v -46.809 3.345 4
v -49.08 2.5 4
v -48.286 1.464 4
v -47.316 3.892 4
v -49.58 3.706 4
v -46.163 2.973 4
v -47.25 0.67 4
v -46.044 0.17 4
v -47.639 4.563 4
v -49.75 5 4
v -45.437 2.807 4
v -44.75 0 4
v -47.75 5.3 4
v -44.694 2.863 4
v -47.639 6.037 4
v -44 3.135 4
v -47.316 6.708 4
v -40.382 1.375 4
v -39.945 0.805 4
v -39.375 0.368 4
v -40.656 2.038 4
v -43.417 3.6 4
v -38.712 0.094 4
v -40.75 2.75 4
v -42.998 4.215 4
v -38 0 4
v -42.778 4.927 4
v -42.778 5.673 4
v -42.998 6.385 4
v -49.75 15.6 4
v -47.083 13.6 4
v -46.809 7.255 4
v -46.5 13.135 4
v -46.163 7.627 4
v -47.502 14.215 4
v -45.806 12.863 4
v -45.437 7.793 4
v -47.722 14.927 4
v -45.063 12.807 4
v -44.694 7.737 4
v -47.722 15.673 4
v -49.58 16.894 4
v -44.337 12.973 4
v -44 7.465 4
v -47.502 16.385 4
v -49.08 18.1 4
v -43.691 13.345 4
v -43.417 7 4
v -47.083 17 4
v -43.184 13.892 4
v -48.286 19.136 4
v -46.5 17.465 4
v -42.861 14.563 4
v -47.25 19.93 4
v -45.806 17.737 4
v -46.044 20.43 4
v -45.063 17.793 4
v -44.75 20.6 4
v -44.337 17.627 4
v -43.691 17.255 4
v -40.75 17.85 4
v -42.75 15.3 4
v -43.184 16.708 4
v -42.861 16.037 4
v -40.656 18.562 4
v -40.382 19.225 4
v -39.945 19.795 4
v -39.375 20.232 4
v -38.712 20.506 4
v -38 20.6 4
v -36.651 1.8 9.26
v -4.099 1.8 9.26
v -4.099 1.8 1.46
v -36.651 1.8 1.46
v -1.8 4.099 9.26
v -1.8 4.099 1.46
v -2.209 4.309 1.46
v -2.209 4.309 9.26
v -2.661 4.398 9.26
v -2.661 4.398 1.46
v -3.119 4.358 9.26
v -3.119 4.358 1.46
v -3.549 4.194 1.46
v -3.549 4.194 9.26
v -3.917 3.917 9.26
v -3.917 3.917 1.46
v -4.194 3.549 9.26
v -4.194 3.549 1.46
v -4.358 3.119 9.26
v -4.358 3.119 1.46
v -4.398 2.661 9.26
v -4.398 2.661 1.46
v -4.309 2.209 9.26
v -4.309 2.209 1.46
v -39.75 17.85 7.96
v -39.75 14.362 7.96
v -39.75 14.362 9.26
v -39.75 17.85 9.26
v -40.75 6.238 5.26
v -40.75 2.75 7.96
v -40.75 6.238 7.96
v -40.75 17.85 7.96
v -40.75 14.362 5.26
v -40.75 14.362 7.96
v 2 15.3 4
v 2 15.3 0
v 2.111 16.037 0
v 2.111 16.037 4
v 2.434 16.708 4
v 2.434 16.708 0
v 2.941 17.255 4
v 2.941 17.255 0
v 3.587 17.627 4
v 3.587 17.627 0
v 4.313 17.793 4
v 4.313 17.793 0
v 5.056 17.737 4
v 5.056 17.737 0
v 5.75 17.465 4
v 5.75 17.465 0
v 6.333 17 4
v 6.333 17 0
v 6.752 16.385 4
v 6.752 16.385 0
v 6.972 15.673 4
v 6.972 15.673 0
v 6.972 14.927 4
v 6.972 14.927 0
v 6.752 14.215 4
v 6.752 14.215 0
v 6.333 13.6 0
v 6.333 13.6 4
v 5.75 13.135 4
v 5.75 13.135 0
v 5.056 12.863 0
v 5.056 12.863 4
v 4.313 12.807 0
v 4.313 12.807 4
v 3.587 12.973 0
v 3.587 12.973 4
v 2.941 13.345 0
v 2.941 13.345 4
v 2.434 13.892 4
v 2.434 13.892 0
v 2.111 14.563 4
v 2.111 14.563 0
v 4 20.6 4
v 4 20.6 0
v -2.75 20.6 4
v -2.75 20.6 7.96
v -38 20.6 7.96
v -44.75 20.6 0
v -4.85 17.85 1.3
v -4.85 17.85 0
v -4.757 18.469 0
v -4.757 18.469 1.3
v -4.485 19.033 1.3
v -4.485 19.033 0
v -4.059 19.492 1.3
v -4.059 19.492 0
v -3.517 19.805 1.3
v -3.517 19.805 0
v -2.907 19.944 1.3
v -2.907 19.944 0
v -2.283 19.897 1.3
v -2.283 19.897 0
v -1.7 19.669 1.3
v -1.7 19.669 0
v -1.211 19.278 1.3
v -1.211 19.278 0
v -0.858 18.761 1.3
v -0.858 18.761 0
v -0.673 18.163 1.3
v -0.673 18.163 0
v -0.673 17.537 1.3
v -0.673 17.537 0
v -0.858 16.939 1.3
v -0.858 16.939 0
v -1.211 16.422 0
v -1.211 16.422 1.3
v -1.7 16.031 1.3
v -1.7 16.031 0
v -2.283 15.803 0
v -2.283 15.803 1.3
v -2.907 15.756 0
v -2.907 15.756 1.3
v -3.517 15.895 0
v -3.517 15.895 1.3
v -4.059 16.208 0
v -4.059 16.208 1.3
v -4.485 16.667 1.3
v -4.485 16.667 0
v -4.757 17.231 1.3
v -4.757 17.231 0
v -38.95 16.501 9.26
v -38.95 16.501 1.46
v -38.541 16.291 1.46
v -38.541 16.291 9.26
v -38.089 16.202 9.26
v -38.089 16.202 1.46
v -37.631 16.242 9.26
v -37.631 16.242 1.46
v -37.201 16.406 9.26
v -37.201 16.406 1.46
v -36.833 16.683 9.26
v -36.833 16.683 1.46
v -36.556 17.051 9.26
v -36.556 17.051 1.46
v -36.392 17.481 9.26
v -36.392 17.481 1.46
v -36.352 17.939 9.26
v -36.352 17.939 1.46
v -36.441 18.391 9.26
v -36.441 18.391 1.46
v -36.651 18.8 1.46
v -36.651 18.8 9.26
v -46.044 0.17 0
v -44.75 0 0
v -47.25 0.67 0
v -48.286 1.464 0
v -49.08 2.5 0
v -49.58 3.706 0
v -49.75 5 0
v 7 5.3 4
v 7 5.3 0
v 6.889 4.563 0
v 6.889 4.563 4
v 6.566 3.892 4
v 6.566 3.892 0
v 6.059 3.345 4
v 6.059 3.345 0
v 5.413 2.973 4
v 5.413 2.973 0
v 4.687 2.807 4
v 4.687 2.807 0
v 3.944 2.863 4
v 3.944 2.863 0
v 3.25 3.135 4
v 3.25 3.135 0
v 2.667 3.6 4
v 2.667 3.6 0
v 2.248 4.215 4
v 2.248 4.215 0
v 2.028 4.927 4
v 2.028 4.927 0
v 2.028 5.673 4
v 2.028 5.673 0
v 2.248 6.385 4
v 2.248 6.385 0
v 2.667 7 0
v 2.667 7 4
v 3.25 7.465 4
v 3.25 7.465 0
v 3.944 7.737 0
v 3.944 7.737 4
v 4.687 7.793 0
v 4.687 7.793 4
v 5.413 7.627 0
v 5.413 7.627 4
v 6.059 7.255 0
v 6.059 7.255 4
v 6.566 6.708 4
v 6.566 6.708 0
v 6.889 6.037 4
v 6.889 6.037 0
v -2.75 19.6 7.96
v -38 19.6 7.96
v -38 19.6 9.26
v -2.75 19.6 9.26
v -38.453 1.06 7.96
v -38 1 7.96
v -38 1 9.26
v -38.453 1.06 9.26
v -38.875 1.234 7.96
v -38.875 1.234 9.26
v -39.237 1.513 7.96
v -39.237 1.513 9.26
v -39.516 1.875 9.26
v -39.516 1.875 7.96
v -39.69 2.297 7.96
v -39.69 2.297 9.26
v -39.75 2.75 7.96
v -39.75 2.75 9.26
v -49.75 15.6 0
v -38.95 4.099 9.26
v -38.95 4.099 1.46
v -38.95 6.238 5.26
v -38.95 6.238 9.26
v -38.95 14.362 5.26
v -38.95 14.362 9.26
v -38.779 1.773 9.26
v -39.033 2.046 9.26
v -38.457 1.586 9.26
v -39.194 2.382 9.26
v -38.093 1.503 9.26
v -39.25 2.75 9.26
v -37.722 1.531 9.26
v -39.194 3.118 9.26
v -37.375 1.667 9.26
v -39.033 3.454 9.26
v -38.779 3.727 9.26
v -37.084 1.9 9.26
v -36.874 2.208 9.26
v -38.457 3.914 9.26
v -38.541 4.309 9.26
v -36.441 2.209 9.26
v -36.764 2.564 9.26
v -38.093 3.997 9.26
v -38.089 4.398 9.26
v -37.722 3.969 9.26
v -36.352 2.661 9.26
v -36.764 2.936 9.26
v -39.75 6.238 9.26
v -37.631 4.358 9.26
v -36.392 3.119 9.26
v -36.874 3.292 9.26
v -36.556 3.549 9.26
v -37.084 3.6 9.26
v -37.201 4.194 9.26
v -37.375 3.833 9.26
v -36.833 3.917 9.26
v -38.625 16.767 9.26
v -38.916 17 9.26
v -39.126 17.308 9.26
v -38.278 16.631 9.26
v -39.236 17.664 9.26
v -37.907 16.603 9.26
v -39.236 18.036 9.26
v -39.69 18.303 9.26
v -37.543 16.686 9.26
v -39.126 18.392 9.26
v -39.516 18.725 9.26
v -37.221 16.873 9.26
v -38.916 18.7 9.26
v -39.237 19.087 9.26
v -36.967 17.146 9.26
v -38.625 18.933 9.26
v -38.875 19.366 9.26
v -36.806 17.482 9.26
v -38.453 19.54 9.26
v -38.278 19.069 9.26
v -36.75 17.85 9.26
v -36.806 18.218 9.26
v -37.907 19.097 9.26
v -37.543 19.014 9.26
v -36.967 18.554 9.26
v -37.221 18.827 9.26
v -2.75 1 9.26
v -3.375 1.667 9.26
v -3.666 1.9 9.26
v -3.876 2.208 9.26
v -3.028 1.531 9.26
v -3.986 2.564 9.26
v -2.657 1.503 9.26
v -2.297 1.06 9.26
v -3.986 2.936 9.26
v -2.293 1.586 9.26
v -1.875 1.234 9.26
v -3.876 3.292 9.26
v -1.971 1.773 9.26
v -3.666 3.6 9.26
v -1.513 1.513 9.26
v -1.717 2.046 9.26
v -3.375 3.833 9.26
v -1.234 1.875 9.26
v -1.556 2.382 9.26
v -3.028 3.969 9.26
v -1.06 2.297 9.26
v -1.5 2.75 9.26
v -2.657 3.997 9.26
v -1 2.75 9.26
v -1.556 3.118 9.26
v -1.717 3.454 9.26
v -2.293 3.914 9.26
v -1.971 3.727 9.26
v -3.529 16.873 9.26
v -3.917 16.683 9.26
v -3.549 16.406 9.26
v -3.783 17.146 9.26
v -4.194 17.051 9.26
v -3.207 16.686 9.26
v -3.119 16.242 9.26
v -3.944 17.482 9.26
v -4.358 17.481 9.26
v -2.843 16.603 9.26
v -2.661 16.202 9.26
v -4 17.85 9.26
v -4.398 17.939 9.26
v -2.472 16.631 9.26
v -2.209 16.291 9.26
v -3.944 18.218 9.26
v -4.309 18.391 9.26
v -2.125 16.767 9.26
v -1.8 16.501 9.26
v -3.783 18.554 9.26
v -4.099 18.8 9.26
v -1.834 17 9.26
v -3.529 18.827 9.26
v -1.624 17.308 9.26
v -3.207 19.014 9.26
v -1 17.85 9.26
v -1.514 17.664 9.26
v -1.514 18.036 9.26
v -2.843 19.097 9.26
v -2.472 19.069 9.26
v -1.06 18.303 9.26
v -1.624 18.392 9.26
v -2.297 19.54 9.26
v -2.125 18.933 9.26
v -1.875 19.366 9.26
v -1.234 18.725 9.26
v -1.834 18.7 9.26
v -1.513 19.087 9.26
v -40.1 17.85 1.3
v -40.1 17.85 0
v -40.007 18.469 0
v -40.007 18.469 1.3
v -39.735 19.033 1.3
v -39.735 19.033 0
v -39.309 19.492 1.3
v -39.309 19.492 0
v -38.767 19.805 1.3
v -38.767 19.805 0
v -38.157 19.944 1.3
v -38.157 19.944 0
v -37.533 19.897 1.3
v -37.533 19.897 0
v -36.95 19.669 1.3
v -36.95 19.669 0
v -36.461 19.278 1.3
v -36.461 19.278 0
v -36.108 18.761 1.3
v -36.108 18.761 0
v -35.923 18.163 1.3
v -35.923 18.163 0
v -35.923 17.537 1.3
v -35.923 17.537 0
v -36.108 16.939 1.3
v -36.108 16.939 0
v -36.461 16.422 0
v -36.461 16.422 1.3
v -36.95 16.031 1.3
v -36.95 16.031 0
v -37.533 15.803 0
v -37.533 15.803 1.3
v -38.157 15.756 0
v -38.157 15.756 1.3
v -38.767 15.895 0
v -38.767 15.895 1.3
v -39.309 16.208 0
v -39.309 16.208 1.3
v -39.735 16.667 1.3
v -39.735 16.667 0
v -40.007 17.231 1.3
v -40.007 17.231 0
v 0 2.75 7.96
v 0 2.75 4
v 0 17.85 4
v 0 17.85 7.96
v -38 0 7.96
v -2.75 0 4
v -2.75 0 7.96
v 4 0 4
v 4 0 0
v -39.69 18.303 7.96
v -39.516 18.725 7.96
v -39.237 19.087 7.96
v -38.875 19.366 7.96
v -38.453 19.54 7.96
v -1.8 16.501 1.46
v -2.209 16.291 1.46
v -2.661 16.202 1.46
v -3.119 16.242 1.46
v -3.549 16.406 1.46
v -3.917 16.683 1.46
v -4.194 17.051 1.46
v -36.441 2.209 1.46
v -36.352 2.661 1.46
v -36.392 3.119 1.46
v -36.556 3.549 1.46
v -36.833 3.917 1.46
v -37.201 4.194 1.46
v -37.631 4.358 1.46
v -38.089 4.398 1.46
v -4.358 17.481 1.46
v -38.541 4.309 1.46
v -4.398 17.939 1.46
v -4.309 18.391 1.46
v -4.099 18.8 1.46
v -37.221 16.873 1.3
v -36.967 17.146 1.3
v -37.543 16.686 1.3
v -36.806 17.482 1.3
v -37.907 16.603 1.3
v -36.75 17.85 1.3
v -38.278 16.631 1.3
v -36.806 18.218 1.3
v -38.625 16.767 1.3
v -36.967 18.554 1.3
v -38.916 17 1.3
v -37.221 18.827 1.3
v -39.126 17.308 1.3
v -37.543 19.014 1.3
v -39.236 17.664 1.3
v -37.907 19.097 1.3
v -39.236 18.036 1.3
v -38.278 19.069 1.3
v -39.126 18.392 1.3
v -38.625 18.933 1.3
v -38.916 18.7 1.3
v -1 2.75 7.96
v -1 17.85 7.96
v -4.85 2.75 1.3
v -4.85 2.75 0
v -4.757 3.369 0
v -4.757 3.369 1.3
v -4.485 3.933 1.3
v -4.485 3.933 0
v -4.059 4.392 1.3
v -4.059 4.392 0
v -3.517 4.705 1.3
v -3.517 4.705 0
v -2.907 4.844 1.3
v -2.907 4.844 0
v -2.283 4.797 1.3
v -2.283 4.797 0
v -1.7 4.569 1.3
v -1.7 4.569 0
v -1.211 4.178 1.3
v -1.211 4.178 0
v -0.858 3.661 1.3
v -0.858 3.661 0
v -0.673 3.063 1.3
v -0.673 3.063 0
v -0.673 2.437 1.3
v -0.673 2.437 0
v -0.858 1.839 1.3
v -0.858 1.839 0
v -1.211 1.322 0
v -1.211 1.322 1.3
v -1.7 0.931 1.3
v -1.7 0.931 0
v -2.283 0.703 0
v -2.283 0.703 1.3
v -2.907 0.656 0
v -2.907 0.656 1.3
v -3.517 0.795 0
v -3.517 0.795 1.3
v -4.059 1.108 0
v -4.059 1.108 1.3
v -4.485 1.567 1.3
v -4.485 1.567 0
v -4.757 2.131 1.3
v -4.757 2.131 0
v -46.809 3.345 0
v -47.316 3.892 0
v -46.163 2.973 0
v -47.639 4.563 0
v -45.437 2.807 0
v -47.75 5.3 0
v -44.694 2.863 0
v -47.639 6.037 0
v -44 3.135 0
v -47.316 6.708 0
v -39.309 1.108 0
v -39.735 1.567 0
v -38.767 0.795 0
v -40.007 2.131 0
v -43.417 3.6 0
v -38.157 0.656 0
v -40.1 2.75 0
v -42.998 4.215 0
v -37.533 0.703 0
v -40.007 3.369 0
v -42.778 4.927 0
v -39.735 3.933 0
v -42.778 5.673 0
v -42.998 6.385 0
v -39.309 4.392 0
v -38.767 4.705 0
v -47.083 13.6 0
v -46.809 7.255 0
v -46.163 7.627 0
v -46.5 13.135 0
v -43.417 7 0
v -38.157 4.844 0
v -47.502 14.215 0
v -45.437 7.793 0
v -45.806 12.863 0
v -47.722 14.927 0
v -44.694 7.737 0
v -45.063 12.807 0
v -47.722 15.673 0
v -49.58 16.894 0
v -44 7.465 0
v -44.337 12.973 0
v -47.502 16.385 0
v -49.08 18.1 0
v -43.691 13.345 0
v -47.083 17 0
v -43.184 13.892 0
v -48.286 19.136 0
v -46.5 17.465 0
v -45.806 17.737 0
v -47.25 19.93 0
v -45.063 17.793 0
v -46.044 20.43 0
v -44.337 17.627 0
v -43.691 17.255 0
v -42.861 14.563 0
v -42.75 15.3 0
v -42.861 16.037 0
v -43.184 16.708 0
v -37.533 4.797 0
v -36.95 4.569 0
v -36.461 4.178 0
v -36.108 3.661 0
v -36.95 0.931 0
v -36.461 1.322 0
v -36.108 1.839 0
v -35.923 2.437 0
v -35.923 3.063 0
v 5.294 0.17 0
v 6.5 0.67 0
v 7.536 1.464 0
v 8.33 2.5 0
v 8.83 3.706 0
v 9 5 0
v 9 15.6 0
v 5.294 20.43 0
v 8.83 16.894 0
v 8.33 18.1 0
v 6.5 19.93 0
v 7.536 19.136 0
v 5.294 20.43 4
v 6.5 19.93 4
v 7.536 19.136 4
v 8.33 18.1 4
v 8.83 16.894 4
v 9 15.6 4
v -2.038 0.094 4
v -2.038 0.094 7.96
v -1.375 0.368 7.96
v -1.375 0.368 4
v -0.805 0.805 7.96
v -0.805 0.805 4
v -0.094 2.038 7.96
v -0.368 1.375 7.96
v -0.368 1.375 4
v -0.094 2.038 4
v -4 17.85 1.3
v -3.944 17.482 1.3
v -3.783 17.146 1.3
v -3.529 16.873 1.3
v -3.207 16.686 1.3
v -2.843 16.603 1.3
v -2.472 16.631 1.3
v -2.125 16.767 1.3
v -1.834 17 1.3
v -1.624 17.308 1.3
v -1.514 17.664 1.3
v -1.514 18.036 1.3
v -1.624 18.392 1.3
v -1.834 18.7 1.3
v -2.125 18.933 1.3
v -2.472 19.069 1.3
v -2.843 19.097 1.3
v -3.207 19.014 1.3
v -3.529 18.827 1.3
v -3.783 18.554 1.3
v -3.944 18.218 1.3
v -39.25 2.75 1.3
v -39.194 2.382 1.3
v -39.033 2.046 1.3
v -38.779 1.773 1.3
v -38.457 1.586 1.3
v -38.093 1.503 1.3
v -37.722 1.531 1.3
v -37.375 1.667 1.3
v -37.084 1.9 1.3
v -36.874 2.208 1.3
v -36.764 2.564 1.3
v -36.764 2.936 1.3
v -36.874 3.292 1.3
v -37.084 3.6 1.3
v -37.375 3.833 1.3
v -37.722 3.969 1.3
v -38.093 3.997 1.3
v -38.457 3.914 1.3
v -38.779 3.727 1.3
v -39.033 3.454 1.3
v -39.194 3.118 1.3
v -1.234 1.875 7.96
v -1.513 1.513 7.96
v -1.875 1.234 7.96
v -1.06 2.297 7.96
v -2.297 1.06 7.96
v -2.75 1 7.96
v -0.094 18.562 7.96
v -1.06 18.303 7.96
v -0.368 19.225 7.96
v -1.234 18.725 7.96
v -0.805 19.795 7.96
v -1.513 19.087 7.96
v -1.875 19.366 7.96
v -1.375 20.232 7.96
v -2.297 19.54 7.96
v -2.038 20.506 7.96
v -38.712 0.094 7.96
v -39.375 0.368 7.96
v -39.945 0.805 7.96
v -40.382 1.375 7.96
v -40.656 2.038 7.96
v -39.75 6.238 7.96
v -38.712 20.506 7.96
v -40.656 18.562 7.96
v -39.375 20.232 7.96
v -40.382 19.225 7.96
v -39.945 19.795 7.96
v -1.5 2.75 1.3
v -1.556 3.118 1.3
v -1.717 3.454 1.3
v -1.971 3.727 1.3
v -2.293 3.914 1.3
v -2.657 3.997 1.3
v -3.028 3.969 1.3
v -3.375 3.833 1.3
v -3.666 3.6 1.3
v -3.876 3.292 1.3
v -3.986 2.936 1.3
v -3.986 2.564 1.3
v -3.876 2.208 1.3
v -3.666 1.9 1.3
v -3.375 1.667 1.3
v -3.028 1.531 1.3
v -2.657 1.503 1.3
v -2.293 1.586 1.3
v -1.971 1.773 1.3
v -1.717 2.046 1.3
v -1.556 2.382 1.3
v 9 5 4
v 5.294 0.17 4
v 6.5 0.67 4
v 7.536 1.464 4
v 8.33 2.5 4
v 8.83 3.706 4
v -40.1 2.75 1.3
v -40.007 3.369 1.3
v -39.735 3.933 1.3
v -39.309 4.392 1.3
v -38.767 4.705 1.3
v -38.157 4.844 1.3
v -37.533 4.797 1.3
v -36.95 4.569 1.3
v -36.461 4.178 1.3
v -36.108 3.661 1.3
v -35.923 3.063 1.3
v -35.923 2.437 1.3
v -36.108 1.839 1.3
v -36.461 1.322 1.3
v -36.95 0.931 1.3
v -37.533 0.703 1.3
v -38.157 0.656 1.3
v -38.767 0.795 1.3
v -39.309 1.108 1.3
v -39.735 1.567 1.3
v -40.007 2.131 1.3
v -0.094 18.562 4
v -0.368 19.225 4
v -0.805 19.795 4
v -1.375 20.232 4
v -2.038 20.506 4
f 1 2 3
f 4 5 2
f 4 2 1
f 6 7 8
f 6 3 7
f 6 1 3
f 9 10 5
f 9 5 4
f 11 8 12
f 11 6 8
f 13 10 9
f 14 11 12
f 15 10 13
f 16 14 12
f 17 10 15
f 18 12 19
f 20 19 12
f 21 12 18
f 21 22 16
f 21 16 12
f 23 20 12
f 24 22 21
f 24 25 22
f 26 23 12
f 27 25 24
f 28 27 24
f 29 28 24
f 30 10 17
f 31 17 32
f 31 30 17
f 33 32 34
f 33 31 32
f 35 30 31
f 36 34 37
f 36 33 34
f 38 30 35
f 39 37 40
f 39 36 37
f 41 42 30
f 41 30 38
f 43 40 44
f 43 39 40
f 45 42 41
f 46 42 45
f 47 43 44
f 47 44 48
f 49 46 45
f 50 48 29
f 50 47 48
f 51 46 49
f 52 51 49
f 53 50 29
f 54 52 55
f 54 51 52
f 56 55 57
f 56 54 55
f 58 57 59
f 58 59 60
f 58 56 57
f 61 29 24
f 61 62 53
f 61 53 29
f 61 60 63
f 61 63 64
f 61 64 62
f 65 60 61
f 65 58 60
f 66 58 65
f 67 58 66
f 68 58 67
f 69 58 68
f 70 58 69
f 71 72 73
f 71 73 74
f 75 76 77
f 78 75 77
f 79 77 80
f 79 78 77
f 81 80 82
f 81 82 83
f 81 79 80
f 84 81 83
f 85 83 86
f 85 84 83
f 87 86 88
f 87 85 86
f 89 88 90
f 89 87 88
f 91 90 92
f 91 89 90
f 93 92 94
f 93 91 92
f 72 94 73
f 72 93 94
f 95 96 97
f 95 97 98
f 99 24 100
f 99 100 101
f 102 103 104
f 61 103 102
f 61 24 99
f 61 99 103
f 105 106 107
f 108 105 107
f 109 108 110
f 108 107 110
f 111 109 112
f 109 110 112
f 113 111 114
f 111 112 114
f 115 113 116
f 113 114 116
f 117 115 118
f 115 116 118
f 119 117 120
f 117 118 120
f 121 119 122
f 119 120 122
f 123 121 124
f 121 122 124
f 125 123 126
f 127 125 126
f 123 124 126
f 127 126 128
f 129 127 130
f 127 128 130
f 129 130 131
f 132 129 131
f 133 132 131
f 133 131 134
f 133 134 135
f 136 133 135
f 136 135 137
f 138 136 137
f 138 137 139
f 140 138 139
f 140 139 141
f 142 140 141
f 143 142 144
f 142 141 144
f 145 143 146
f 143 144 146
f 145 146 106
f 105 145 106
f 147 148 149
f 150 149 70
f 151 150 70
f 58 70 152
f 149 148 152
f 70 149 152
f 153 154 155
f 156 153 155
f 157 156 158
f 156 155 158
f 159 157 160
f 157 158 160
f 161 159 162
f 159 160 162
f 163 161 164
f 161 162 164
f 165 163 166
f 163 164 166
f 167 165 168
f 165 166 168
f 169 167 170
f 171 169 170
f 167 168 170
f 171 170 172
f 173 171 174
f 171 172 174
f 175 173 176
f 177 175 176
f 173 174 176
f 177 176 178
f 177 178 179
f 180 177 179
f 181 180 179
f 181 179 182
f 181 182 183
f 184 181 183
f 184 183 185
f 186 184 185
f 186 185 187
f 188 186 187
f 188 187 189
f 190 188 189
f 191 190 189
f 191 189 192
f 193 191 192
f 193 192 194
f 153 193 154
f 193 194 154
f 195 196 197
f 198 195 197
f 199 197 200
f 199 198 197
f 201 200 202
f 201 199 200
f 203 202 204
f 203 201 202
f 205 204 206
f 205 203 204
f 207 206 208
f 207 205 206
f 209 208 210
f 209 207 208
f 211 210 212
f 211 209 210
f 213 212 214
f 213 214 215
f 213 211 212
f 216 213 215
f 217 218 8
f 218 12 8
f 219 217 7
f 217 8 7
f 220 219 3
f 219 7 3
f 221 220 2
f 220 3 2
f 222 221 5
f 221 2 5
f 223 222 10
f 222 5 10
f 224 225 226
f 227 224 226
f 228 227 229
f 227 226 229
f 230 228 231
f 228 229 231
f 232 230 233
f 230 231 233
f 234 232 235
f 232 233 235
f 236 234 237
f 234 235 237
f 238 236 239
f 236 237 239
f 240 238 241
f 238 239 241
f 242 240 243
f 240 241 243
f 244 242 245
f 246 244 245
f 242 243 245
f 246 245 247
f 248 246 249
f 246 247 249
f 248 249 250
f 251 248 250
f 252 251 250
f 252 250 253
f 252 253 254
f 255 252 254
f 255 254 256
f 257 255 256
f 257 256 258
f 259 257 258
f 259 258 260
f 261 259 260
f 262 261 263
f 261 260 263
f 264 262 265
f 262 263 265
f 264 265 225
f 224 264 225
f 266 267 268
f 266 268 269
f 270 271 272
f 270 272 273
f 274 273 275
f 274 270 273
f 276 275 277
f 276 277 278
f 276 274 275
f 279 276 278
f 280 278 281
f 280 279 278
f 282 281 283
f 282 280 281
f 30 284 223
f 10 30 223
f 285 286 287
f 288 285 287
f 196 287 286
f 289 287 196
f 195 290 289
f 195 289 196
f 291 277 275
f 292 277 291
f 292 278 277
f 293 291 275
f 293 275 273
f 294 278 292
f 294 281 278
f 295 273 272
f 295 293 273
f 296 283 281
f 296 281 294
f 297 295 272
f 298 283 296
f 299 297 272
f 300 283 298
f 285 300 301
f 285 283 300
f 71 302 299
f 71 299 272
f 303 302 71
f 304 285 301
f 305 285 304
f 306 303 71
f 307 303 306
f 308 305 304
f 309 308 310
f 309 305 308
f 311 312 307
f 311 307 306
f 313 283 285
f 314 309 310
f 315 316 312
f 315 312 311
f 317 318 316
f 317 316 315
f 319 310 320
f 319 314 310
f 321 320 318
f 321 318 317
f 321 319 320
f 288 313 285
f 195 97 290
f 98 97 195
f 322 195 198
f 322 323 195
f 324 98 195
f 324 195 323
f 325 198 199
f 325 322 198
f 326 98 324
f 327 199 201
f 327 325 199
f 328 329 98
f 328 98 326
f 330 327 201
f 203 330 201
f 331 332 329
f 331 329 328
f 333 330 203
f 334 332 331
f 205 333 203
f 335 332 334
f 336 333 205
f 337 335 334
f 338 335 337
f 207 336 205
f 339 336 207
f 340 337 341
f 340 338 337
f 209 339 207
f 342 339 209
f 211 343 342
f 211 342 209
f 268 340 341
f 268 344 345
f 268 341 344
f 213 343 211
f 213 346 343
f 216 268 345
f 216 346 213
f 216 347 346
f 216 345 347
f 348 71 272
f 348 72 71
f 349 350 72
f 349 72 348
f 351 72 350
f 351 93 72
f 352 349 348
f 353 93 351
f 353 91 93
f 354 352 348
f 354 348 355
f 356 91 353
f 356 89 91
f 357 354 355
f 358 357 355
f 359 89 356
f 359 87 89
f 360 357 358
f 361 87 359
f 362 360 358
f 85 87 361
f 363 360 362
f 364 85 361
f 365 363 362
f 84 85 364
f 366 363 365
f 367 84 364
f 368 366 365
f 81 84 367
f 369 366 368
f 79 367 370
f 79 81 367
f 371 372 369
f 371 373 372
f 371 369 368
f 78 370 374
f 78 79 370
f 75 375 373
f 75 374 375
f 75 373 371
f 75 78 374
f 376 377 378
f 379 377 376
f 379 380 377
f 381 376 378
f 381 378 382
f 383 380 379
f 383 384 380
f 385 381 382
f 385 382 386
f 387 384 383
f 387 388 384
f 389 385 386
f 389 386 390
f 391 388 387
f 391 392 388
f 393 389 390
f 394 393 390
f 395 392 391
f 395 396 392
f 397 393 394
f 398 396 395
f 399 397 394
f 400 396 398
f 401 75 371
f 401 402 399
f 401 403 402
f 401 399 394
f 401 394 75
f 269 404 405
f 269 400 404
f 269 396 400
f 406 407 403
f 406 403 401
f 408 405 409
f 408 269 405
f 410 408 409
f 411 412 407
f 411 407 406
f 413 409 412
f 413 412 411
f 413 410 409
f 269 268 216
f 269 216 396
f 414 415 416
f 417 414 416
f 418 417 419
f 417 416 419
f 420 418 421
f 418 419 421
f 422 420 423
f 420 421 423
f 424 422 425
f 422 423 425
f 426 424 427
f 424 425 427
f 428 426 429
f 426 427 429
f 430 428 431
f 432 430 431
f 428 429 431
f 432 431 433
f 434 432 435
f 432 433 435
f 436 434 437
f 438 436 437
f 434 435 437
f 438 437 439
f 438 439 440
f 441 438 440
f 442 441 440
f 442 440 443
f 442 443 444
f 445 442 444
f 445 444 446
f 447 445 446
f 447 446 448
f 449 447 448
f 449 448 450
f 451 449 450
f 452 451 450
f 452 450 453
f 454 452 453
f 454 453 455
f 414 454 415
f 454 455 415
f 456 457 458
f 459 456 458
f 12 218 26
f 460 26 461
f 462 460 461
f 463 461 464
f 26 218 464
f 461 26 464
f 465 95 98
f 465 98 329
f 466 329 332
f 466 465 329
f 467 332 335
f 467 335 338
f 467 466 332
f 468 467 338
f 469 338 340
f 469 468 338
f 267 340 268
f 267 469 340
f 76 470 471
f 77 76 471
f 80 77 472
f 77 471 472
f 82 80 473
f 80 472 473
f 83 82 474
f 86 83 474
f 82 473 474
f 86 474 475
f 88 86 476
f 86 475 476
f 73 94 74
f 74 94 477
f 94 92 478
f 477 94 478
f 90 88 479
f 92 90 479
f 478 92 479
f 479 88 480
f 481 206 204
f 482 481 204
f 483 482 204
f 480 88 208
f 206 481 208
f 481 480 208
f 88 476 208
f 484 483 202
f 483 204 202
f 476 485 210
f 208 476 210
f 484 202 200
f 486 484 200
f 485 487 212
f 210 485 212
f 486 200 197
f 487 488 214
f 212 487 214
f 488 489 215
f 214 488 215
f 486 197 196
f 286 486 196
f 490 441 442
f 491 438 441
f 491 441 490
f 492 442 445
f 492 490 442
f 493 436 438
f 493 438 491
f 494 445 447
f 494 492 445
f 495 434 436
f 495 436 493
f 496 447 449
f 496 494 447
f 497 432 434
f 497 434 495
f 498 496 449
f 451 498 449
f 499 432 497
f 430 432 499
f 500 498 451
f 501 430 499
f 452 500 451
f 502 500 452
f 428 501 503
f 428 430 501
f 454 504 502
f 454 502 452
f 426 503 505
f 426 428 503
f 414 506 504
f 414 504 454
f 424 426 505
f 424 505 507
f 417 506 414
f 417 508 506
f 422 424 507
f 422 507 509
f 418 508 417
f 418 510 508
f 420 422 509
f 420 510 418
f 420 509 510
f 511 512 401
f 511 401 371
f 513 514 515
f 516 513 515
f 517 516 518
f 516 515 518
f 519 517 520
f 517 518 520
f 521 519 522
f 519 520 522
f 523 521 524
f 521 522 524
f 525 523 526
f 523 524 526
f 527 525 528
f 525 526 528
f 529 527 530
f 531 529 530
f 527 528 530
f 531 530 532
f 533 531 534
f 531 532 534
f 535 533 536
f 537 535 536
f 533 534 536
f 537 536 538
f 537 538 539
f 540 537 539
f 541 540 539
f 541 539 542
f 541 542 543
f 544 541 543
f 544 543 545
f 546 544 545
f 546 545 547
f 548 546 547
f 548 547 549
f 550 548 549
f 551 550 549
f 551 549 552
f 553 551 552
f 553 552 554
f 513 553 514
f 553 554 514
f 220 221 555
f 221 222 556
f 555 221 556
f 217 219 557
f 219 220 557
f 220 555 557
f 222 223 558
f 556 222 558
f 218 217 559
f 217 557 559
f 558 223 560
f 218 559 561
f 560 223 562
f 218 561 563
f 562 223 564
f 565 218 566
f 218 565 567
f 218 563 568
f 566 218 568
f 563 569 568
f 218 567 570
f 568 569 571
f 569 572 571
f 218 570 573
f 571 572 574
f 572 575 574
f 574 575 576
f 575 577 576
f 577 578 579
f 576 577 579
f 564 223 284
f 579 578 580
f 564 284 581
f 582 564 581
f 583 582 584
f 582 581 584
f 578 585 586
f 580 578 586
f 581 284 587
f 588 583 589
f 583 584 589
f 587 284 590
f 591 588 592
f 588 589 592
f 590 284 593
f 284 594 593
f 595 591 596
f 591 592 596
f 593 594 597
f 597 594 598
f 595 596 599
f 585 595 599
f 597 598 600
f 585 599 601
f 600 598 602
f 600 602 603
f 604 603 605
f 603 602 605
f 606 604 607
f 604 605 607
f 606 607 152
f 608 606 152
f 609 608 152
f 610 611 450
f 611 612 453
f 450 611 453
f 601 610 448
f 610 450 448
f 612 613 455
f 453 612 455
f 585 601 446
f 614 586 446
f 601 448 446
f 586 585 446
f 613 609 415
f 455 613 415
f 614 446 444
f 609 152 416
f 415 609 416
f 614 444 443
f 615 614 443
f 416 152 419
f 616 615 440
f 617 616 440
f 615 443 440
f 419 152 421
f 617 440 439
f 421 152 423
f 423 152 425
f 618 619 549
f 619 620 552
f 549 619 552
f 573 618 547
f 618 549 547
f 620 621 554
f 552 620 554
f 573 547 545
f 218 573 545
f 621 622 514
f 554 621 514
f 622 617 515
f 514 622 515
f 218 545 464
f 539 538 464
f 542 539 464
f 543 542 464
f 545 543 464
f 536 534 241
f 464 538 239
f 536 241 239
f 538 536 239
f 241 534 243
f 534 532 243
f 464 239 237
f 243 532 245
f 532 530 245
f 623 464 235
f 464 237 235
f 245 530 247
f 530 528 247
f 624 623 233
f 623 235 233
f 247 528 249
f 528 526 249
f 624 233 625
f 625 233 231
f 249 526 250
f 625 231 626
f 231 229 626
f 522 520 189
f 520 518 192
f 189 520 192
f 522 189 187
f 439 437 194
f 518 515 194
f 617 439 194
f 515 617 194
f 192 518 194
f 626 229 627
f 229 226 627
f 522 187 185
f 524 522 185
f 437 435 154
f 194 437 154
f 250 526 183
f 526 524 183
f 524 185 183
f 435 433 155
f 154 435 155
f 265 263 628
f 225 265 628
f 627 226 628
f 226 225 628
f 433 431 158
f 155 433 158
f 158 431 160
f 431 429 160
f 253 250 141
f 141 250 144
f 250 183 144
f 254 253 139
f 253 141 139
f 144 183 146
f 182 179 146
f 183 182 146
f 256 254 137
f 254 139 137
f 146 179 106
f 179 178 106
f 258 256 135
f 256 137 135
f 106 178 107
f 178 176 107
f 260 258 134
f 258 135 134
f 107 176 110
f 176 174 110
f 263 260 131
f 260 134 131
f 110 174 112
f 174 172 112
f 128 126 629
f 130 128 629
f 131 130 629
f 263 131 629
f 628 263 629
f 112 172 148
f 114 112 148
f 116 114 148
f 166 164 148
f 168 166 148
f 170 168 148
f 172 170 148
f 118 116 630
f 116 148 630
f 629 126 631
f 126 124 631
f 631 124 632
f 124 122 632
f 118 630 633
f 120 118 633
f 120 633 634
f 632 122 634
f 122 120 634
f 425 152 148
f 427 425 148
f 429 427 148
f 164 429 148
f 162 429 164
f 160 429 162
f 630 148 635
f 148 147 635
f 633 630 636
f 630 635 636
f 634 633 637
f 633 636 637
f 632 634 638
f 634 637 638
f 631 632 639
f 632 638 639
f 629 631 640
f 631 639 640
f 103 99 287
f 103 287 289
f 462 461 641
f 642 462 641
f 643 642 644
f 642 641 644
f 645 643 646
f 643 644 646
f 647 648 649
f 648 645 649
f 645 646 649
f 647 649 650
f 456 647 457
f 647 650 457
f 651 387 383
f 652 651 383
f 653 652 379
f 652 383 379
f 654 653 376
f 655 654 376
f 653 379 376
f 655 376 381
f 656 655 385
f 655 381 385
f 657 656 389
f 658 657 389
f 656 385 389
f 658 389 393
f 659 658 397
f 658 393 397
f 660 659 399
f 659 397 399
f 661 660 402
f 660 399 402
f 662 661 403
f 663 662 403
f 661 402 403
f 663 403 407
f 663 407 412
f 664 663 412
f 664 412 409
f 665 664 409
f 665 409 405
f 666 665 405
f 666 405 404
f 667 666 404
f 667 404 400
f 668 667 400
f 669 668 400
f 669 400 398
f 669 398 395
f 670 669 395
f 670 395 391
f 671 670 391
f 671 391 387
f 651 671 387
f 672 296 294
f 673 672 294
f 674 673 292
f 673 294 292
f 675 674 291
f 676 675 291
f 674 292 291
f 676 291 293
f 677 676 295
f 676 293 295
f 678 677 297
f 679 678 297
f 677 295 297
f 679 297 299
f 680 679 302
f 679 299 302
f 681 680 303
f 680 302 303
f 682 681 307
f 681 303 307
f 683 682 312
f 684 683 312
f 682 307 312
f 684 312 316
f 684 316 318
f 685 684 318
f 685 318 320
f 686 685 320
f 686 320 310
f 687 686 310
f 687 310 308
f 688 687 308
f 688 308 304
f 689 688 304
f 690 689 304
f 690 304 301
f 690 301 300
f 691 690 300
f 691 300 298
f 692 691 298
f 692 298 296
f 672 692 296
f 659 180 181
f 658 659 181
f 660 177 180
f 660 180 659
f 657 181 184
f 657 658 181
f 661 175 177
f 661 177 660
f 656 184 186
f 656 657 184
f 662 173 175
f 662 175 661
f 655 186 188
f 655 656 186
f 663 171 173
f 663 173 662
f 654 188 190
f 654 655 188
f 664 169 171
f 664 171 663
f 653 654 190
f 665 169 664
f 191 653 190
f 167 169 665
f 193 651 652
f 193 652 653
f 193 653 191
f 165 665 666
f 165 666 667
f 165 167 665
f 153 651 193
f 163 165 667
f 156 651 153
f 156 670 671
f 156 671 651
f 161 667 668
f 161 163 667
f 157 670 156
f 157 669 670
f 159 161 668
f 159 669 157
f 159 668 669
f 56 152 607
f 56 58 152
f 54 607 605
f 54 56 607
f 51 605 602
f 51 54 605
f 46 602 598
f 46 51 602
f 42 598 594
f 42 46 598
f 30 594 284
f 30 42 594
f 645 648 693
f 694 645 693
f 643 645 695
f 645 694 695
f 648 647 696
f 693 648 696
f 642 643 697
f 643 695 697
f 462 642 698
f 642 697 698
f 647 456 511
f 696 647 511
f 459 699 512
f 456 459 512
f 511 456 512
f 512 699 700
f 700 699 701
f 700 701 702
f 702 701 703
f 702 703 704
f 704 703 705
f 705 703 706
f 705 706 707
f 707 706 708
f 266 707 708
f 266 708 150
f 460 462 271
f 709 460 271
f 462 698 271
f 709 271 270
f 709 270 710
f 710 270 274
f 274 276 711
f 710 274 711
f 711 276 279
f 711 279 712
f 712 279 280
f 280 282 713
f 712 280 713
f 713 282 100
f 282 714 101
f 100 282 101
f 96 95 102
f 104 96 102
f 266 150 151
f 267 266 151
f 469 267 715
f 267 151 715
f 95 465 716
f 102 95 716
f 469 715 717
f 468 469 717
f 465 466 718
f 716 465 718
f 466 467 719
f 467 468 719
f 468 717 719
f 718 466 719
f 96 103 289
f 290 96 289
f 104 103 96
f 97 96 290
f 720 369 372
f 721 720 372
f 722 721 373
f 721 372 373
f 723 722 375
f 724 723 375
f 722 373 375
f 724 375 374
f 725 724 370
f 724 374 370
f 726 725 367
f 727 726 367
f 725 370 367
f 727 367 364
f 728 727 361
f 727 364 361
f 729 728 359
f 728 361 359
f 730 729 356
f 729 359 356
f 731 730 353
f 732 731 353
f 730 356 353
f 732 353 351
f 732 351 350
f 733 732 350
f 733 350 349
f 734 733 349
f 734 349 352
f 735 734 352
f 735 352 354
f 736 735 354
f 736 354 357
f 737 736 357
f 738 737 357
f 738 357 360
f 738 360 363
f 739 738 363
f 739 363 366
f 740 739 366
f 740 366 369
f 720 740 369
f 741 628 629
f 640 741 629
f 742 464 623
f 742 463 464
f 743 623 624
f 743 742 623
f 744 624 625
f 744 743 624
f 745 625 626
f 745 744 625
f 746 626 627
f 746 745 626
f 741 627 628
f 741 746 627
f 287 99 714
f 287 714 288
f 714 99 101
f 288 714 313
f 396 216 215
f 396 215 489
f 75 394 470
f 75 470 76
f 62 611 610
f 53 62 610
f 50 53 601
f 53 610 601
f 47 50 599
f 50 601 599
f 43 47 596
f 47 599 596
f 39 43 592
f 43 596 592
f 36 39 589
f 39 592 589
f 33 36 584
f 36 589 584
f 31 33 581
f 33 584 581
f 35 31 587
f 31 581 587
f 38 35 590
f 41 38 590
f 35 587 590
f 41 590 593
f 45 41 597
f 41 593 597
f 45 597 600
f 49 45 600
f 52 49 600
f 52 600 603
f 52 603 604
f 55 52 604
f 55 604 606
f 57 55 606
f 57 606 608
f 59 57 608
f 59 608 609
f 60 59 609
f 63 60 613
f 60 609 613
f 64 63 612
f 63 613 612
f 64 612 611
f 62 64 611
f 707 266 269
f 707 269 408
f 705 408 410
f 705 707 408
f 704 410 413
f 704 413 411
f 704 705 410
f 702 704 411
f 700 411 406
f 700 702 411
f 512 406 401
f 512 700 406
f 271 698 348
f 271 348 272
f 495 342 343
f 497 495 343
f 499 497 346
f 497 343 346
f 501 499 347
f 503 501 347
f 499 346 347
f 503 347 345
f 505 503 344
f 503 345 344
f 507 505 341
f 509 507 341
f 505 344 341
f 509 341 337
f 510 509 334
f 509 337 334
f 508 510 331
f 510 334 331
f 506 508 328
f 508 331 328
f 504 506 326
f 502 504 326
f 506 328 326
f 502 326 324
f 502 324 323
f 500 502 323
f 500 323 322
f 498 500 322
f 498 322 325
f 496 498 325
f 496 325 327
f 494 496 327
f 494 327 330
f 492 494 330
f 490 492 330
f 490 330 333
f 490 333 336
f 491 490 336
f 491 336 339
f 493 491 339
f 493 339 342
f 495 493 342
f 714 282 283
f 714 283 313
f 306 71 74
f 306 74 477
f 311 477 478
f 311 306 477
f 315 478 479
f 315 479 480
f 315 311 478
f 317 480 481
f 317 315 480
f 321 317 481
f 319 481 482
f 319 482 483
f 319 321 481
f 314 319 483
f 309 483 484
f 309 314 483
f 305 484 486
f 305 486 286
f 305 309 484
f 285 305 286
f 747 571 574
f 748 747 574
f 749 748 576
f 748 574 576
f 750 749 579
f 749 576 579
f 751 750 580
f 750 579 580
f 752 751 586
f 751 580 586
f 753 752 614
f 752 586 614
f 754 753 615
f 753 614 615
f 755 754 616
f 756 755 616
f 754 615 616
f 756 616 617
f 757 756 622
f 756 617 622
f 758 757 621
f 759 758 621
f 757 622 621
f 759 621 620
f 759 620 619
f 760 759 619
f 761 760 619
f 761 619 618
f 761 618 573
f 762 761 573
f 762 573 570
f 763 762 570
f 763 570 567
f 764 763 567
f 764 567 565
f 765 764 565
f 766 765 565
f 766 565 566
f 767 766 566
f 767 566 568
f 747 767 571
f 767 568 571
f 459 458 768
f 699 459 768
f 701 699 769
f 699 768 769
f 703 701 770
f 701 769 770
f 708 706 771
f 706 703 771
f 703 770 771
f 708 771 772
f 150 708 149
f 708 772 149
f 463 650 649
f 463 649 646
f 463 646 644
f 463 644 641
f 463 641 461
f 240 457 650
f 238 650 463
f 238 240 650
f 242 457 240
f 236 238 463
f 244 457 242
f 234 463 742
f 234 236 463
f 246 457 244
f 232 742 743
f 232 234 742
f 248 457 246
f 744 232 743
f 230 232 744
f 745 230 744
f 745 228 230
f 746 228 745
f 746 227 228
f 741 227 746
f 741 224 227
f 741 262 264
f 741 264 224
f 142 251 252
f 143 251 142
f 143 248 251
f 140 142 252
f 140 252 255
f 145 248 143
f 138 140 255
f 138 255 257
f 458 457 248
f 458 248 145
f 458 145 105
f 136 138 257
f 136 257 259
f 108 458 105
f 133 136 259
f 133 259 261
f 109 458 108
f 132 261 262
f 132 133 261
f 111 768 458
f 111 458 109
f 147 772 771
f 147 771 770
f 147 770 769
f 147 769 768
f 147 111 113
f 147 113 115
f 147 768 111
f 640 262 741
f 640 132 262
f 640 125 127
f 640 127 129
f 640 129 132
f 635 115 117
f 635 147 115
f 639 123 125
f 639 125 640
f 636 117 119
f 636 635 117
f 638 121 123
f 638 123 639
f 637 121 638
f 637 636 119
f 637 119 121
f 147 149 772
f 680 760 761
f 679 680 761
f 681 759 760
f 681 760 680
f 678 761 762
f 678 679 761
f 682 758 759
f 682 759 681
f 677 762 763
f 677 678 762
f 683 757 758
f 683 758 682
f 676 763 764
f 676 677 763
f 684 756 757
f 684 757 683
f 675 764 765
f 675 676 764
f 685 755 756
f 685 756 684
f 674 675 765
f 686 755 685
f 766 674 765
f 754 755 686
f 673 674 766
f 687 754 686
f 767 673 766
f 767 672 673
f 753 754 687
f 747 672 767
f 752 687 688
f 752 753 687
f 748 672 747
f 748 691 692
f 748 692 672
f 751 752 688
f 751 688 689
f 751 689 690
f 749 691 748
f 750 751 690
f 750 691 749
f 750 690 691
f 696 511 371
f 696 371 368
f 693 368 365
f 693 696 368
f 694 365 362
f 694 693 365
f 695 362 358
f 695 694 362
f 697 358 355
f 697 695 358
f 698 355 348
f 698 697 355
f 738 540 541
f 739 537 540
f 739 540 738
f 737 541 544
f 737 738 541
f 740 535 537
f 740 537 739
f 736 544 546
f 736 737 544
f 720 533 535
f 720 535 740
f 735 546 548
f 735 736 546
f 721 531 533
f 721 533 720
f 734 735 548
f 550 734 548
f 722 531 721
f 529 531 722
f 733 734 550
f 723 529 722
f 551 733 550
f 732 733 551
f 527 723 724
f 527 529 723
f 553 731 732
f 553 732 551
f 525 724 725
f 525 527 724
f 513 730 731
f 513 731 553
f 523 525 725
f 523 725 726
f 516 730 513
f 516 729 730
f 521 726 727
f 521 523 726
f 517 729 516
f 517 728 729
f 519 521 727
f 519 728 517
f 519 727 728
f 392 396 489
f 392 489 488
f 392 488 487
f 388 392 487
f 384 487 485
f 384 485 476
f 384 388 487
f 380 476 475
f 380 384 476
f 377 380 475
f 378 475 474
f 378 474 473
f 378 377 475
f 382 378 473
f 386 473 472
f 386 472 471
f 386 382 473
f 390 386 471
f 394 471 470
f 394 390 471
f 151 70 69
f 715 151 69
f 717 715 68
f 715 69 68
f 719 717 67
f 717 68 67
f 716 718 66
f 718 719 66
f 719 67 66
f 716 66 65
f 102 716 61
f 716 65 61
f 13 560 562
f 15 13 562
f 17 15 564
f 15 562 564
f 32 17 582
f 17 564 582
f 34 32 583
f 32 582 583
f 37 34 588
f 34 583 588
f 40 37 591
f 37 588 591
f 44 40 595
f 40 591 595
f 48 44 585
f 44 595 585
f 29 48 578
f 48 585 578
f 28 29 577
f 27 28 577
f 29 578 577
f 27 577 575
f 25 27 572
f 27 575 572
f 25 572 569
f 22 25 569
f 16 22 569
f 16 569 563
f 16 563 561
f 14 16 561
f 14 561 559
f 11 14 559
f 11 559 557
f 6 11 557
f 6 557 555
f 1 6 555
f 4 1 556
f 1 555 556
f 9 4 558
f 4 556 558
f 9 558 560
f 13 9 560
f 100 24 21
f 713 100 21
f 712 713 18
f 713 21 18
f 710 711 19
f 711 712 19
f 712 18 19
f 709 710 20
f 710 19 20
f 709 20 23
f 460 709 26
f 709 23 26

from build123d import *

# Parameters (mm, degrees)
ESQUISSE1_W         = 40.75
ESQUISSE1_H         = 20.6
EXTRUSION1_DEPTH    = 9.26
ESQUISSE2_R         = 1.25
EXTRUSION2_DEPTH    = 47.590450738
ESQUISSE4_OUTSIDE_W = 52.068
ESQUISSE4_OUTSIDE_H = 31.918
EXTRUSION5_DEPTH    = 47.590450738
EXTRUSION4_START    = -1.3
EXTRUSION4_DEPTH    = 1.3
EXTRUSION9_DEPTH    = 7.8
EXTRUSION10_REACH   = 48.59
ESQUISSE7_W         = 4
ESQUISSE7_H         = 8.124058542
ESQUISSE8_R         = 2.5
EXTRUSION11_DEPTH   = 4
CONG_1_R            = 5
ESQUISSE9_R         = 2.1
EXTRUSION12_DEPTH   = 1.3


with BuildPart() as part:
    # Esquisse1 → Extrusion1 (new body)
    with BuildSketch(Plane.XY):
        with Locations((-20.375, 10.3)):
            Rectangle(ESQUISSE1_W, ESQUISSE1_H)
    extrude(amount=EXTRUSION1_DEPTH)

    # Esquisse2 → Extrusion2 (cut, through all)
    with BuildSketch(Plane.XY.offset(9.26)):
        with Locations((-38, 17.85)):
            Circle(ESQUISSE2_R)
        with Locations(Location((-38, 2.75, 0), (0, 0, 180))):
            Circle(ESQUISSE2_R)
        with Locations((-2.75, 2.75)):
            Circle(ESQUISSE2_R)
        with Locations(Location((-2.75, 17.85, 0), (0, 0, 180))):
            Circle(ESQUISSE2_R)
    extrude(amount=-EXTRUSION2_DEPTH, mode=Mode.SUBTRACT)

    # Esquisse4 outside → Extrusion5 (cut, through all)
    with BuildSketch(Plane(origin=(0, 0, 0), x_dir=(-1, 0, 0), z_dir=(0, 0, -1))):
        with Locations((20.375, 10.3)):
            Rectangle(ESQUISSE4_OUTSIDE_W, ESQUISSE4_OUTSIDE_H)
        with BuildLine():
            Line((2.75, 20.6), (38, 20.6))
            ThreePointArc((38, 20.6), (39.944543648, 19.794543648), (40.75, 17.85))
            Line((40.75, 17.85), (40.75, 2.75))
            ThreePointArc((40.75, 2.75), (39.944543648, 0.805456352), (38, 0))
            Line((38, 0), (2.75, 0))
            ThreePointArc((2.75, 0), (0.805456352, 0.805456352), (0, 2.75))
            Line((0, 2.75), (0, 17.85))
            ThreePointArc((0, 17.85), (0.805456352, 19.794543648), (2.75, 20.6))
        make_face(mode=Mode.SUBTRACT)
    extrude(amount=-EXTRUSION5_DEPTH, mode=Mode.SUBTRACT)

    # Esquisse3 → Extrusion4 (cut)
    with BuildSketch(Plane.XY.offset(9.26).offset(EXTRUSION4_START)):
        with BuildLine():
            Line((-38, 20.6), (-2.75, 20.6))
            ThreePointArc((-2.75, 20.6), (-0.805456352, 19.794543648), (0, 17.85))
            Line((0, 17.85), (0, 2.75))
            ThreePointArc((0, 2.75), (-0.805456352, 0.805456352), (-2.75, 0))
            Line((-2.75, 0), (-38, 0))
            ThreePointArc((-38, 0), (-39.944543648, 0.805456352), (-40.75, 2.75))
            Line((-40.75, 2.75), (-40.75, 17.85))
            ThreePointArc((-40.75, 17.85), (-39.944543648, 19.794543648), (-38, 20.6))
        make_face()
        with BuildLine():
            Line((-38, 19.6), (-2.75, 19.6))
            ThreePointArc((-2.75, 19.6), (-1.512563133, 19.087436867), (-1, 17.85))
            Line((-1, 17.85), (-1, 2.75))
            ThreePointArc((-1, 2.75), (-1.512563133, 1.512563133), (-2.75, 1))
            Line((-2.75, 1), (-38, 1))
            ThreePointArc((-38, 1), (-39.237436867, 1.512563133), (-39.75, 2.75))
            Line((-39.75, 2.75), (-39.75, 17.85))
            ThreePointArc((-39.75, 17.85), (-39.237436867, 19.087436867), (-38, 19.6))
        make_face(mode=Mode.SUBTRACT)
    extrude(amount=EXTRUSION4_DEPTH, mode=Mode.SUBTRACT)

    # Esquisse6 → Extrusion9 (cut)
    with BuildSketch(Plane.XY.offset(9.26)):
        with BuildLine():
            Line((-36.650926244, 18.8), (-4.099073756, 18.8))
            ThreePointArc((-4.099073756, 18.8), (-3.916726189, 16.683273811), (-1.8, 16.500926244))
            Line((-1.8, 16.500926244), (-1.8, 4.099073756))
            ThreePointArc((-1.8, 4.099073756), (-3.916726189, 3.916726189), (-4.099073756, 1.8))
            Line((-4.099073756, 1.8), (-36.650926244, 1.8))
            ThreePointArc((-36.650926244, 1.8), (-36.833273811, 3.916726189), (-38.95, 4.099073756))
            Line((-38.95, 4.099073756), (-38.95, 16.500926244))
            ThreePointArc((-38.95, 16.500926244), (-36.833273811, 16.683273811), (-36.650926244, 18.8))
        make_face()
    extrude(amount=-EXTRUSION9_DEPTH, mode=Mode.SUBTRACT)

    # Extrusion10: up to this face of the body (flat: up to its plane)
    extrusion10_end = Plane(part.part.faces().sort_by_distance((-38.95, 10.3, 5.36))[0])
    # Esquisse7 → Extrusion10 (cut, up to the picked face)
    with BuildSketch(Plane.ZY.offset(40.75), mode=Mode.PRIVATE) as extrusion10_sk1:
        with Locations((7.26, 10.3)):
            Rectangle(ESQUISSE7_W, ESQUISSE7_H)
    extrusion10_tool1 = split(extrude(extrusion10_sk1.sketch, amount=-EXTRUSION10_REACH, mode=Mode.PRIVATE), bisect_by=extrusion10_end, keep=Keep.BOTH, mode=Mode.PRIVATE)
    add(extrusion10_tool1.solids().sort_by(Axis((-40.75, 10.3, 7.26), (1, 0, 0)))[0], mode=Mode.SUBTRACT)

    # Esquisse8 → Extrusion11 (add)
    # profile 1 of 2: a face of its own
    with BuildSketch(Plane(origin=(0, 0, 0), x_dir=(-1, 0, 0), z_dir=(0, 0, -1))):
        with BuildLine():
            Line((-9, 20.6), (2.75, 20.6))
            ThreePointArc((2.75, 20.6), (0.805456352, 19.794543648), (0, 17.85))
            Line((0, 17.85), (0, 2.75))
            ThreePointArc((0, 2.75), (0.805456352, 0.805456352), (2.75, 0))
            Line((2.75, 0), (-9, 0))
            Line((-9, 0), (-9, 20.6))
        make_face()
        with Locations((-4.5, 15.3)):
            Circle(ESQUISSE8_R, mode=Mode.SUBTRACT)
        with Locations(Location((-4.5, 5.3, 0), (0, 0, 180))):
            Circle(ESQUISSE8_R, mode=Mode.SUBTRACT)
    # profile 2 of 2: a face of its own
    with BuildSketch(Plane(origin=(0, 0, 0), x_dir=(-1, 0, 0), z_dir=(0, 0, -1))):
        with BuildLine():
            Line((49.75, 0), (38, 0))
            ThreePointArc((38, 0), (39.944543648, 0.805456352), (40.75, 2.75))
            Line((40.75, 2.75), (40.75, 17.85))
            ThreePointArc((40.75, 17.85), (39.944543648, 19.794543648), (38, 20.6))
            Line((38, 20.6), (49.75, 20.6))
            Line((49.75, 20.6), (49.75, 0))
        make_face()
        with Locations((45.25, 5.3)):
            Circle(ESQUISSE8_R, mode=Mode.SUBTRACT)
        with Locations(Location((45.25, 15.3, 0), (0, 0, 180))):
            Circle(ESQUISSE8_R, mode=Mode.SUBTRACT)
    extrude(amount=-EXTRUSION11_DEPTH)

    # Congé1
    cong_1_edges = [part.edges().sort_by_distance(p)[0] for p in [
        (9, 0, 2),
        (9, 20.6, 2),
        (-49.75, 20.6, 2),
        (-49.75, 0, 2),
    ]]
    fillet(cong_1_edges, radius=CONG_1_R)

    # Esquisse9 → Extrusion12 (cut)
    with BuildSketch(Plane(origin=(0, 0, 0), x_dir=(-1, 0, 0), z_dir=(0, 0, -1))):
        with Locations((2.75, 17.85)):
            Circle(ESQUISSE9_R)
        with Locations((38, 17.85)):
            Circle(ESQUISSE9_R)
        with Locations((38, 2.75)):
            Circle(ESQUISSE9_R)
        with Locations((2.75, 2.75)):
            Circle(ESQUISSE9_R)
    extrude(amount=-EXTRUSION12_DEPTH, mode=Mode.SUBTRACT)


solid = part.part
